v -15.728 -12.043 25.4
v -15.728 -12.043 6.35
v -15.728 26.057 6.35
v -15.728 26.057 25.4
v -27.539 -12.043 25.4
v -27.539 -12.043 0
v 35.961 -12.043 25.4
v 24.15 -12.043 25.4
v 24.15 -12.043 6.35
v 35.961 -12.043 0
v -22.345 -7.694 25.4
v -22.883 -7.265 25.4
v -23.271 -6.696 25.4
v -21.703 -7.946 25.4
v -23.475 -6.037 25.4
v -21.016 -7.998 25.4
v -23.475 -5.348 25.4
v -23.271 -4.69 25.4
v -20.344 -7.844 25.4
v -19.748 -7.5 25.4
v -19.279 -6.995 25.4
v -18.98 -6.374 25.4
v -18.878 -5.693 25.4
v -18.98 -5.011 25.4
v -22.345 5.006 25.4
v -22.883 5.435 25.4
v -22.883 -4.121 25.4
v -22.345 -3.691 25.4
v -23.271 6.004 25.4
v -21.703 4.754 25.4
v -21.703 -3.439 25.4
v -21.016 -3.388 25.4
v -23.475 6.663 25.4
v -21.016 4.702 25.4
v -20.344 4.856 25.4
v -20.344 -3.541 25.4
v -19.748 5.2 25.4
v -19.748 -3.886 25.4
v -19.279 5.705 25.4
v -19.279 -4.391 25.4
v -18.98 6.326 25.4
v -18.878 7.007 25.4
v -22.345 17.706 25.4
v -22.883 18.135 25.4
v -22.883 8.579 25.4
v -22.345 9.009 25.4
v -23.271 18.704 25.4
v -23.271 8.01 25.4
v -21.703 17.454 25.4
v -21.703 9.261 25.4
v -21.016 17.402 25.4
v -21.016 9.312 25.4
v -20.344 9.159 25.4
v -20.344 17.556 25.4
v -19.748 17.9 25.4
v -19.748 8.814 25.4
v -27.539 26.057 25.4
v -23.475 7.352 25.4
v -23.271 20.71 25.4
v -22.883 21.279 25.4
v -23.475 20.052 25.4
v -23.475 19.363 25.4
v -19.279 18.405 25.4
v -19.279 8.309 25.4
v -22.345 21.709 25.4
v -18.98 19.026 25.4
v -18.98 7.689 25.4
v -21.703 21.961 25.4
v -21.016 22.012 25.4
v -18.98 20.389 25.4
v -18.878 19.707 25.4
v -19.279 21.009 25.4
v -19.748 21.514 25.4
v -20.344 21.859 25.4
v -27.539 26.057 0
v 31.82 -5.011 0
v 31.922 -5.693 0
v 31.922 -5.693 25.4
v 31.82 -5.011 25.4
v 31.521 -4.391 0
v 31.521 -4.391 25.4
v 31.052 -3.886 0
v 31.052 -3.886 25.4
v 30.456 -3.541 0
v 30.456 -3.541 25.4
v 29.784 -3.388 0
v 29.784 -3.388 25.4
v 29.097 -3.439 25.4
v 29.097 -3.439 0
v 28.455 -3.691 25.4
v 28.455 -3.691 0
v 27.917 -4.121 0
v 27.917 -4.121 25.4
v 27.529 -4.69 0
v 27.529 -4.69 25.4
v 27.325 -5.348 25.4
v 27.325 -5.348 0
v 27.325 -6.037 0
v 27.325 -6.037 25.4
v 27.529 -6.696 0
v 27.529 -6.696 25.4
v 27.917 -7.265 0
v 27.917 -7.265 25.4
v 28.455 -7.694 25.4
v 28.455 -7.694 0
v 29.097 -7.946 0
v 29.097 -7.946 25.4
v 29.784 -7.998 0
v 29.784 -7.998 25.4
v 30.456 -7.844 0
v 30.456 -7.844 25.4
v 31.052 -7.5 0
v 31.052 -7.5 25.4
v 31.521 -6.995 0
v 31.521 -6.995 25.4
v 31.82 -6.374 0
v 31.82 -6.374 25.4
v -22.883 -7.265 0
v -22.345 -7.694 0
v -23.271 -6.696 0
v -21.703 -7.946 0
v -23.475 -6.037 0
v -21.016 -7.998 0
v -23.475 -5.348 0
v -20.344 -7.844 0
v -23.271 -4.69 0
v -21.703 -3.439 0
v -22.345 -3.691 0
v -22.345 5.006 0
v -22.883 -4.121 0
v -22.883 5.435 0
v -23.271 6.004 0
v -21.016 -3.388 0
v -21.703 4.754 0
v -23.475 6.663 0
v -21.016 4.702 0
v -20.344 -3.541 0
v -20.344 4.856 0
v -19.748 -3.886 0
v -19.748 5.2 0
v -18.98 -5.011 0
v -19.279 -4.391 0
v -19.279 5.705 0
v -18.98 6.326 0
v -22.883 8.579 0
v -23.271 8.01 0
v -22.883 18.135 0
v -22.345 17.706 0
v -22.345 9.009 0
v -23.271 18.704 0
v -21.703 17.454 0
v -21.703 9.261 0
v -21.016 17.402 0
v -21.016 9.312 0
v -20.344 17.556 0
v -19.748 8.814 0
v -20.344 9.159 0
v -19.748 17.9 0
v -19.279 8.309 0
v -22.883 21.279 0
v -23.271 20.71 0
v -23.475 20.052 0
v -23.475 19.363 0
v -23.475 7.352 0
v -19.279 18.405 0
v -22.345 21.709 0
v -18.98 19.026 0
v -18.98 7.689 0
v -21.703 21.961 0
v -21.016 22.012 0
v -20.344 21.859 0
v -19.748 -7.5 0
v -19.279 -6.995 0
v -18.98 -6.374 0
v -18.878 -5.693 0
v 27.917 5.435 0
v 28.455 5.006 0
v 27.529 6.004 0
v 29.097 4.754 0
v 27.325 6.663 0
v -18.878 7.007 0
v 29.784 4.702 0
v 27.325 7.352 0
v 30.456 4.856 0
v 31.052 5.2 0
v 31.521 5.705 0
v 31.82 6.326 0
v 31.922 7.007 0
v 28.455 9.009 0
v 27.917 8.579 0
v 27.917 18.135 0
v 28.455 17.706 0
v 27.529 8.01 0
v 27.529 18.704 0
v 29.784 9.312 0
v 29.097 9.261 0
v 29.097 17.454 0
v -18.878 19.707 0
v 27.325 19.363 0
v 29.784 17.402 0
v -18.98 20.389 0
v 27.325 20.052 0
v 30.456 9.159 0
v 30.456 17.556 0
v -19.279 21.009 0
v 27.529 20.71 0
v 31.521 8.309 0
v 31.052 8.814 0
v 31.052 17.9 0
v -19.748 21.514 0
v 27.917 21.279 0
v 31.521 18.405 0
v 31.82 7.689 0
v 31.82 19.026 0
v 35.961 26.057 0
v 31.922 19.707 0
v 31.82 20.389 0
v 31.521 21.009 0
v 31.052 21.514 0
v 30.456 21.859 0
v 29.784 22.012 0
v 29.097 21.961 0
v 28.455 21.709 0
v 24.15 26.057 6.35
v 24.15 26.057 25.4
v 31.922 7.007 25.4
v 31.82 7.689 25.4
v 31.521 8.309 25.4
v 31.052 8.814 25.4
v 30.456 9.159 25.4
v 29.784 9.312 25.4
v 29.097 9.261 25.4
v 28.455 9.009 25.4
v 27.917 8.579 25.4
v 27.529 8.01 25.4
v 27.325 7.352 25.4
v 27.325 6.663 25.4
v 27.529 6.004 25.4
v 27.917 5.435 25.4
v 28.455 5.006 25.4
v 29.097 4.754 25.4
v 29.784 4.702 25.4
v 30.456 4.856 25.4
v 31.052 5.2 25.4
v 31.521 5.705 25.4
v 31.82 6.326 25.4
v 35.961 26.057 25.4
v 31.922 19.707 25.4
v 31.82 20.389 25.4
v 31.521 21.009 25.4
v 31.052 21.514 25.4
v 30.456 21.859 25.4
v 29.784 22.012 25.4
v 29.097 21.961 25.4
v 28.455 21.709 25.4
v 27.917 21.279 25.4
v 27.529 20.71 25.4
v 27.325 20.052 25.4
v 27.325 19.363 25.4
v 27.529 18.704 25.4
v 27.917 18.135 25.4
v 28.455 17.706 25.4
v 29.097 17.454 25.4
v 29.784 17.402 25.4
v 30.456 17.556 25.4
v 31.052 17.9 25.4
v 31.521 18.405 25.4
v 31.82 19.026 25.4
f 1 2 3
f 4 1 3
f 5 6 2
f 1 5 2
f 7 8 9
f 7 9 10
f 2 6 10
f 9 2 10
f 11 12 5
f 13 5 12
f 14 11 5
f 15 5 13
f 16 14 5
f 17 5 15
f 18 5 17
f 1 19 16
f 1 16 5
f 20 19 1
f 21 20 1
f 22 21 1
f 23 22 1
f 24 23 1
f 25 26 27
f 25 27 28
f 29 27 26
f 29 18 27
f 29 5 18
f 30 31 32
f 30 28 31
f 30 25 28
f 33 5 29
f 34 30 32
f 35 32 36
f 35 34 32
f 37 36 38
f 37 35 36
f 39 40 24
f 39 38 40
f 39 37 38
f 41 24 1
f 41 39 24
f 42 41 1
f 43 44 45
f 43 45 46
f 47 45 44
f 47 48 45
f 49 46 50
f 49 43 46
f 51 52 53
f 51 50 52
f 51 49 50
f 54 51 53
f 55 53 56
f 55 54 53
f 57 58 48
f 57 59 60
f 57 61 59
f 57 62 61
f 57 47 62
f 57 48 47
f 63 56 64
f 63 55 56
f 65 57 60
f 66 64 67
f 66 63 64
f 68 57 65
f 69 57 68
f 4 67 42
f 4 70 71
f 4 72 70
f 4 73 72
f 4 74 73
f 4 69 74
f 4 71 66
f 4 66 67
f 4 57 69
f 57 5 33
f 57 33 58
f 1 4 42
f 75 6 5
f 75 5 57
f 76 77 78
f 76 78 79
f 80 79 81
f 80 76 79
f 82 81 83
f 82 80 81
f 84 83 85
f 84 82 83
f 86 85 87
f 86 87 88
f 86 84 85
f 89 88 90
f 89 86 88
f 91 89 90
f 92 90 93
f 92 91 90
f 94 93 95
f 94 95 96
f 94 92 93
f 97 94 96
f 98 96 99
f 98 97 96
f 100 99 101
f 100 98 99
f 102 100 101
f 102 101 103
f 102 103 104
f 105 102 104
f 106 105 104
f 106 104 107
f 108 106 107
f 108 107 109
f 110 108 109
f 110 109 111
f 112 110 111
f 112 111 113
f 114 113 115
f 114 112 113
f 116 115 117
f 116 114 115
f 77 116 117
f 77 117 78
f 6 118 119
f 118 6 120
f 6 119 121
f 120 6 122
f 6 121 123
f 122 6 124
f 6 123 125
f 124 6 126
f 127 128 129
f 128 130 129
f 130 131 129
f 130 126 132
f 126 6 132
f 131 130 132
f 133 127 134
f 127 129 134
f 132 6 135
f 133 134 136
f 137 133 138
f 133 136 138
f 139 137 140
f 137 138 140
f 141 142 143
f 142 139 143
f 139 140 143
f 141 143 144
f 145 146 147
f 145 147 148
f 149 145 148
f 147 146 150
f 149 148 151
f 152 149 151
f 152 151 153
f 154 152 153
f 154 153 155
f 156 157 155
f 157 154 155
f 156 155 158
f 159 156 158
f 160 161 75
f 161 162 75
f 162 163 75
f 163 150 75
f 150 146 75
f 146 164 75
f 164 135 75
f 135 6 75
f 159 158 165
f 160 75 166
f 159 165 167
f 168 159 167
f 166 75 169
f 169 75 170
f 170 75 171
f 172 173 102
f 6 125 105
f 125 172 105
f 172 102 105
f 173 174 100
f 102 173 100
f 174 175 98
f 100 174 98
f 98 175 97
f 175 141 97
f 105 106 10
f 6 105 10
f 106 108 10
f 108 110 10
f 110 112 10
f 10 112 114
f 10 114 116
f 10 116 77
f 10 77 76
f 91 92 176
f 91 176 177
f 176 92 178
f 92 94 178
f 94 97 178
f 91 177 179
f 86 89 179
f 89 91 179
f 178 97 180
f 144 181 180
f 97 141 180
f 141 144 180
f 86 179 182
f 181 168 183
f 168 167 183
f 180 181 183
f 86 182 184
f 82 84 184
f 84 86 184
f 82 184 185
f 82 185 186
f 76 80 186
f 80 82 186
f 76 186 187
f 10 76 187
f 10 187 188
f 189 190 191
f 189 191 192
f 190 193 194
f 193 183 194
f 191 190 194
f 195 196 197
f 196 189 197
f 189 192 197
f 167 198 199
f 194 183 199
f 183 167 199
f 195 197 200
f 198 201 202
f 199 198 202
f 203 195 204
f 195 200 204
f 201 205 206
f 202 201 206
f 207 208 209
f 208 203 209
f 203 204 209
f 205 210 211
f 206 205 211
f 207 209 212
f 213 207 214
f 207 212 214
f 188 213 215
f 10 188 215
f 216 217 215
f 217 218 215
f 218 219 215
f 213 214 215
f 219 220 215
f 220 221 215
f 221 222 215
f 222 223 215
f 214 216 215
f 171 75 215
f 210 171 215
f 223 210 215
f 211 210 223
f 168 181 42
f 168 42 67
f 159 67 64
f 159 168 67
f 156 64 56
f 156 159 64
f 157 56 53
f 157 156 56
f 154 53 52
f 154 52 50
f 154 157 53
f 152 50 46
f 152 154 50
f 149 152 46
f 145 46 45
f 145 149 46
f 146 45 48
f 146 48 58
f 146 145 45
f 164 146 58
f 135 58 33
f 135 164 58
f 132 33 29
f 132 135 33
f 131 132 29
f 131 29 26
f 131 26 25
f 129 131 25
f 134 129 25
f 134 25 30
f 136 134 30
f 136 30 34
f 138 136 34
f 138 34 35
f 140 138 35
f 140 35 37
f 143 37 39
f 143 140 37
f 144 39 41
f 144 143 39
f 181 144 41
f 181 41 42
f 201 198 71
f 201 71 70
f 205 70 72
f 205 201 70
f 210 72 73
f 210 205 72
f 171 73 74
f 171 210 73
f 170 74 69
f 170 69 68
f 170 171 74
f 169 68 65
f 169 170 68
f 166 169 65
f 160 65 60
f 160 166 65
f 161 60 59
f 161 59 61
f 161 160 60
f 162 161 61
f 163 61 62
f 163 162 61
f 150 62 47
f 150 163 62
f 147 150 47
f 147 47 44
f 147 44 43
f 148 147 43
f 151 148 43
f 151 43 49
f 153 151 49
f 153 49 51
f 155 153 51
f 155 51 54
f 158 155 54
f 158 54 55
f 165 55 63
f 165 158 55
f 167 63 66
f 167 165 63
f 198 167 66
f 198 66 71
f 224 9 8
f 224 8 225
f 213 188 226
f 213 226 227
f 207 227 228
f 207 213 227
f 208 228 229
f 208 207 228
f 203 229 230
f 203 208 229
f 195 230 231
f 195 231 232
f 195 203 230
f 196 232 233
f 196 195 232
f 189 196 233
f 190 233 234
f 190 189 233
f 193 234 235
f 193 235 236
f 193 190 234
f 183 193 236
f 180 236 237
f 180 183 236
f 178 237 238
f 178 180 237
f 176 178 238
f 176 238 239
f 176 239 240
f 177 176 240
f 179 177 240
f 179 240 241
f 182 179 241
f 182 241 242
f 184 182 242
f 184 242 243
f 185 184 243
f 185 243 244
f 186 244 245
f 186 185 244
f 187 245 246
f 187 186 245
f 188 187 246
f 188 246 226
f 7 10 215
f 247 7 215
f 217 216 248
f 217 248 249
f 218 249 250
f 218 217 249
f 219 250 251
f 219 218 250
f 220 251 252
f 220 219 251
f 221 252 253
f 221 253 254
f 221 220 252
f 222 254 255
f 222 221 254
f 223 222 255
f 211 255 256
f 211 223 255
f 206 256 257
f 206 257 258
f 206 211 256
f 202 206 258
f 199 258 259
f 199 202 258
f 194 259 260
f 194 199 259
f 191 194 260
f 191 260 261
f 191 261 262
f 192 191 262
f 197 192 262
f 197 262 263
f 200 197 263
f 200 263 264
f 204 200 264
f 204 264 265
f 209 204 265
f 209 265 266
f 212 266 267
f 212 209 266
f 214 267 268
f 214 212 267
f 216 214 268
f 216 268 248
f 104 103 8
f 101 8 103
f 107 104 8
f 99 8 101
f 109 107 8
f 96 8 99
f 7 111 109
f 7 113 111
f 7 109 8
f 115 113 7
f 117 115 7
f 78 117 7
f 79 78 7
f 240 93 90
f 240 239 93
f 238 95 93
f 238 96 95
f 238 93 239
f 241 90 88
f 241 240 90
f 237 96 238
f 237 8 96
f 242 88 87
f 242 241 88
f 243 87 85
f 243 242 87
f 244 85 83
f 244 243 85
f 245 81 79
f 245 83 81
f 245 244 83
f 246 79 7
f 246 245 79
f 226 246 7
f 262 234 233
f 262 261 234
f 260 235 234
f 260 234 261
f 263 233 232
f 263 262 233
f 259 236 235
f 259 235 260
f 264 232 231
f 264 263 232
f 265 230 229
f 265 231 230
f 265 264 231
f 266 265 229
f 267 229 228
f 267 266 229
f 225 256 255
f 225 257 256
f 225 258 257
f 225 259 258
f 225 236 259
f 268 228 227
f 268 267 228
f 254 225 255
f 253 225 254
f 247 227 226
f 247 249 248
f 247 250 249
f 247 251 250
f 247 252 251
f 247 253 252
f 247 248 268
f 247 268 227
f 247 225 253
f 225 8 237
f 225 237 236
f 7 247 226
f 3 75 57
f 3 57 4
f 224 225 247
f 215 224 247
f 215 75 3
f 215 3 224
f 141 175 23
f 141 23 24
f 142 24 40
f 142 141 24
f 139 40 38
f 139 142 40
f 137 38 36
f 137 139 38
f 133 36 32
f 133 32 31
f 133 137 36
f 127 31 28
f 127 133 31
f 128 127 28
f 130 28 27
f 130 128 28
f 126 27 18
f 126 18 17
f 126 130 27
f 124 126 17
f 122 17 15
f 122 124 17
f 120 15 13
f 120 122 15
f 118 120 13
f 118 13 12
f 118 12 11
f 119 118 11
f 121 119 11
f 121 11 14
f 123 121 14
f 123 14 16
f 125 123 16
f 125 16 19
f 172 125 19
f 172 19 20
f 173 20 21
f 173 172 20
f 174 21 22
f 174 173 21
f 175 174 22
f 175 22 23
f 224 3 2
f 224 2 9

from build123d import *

# Parameters (mm, degrees)
F0_W     = 11.811
F0_H     = 38.1
F0_R     = 2.3114
F1_DEPTH = 25.4
F0_W_2   = 39.878
F2_DEPTH = 6.35


with BuildPart() as f1:
    # F0 (on Top) → F1 (new body)
    with BuildSketch(Plane.XY):
        with Locations((-21.633447, 7.007305)):
            Rectangle(F0_W, F0_H)
        with Locations((-21.188947, -5.692695)):
            Circle(F0_R, mode=Mode.SUBTRACT)
        with Locations((-21.188947, 7.007305)):
            Circle(F0_R, mode=Mode.SUBTRACT)
        with Locations((-21.188947, 19.707305)):
            Circle(F0_R, mode=Mode.SUBTRACT)
        with Locations((30.055553, 7.007305)):
            Rectangle(F0_W, F0_H)
        with Locations((29.611053, -5.692695)):
            Circle(F0_R, mode=Mode.SUBTRACT)
        with Locations((29.611053, 7.007305)):
            Circle(F0_R, mode=Mode.SUBTRACT)
        with Locations((29.611053, 19.707305)):
            Circle(F0_R, mode=Mode.SUBTRACT)
    extrude(amount=F1_DEPTH)

    # F0 (on Top) → F2 (join)
    with BuildSketch(Plane.XY):
        with Locations((4.211053, 7.007305)):
            Rectangle(F0_W_2, F0_H)
    extrude(amount=F2_DEPTH)


solid = f1.part
